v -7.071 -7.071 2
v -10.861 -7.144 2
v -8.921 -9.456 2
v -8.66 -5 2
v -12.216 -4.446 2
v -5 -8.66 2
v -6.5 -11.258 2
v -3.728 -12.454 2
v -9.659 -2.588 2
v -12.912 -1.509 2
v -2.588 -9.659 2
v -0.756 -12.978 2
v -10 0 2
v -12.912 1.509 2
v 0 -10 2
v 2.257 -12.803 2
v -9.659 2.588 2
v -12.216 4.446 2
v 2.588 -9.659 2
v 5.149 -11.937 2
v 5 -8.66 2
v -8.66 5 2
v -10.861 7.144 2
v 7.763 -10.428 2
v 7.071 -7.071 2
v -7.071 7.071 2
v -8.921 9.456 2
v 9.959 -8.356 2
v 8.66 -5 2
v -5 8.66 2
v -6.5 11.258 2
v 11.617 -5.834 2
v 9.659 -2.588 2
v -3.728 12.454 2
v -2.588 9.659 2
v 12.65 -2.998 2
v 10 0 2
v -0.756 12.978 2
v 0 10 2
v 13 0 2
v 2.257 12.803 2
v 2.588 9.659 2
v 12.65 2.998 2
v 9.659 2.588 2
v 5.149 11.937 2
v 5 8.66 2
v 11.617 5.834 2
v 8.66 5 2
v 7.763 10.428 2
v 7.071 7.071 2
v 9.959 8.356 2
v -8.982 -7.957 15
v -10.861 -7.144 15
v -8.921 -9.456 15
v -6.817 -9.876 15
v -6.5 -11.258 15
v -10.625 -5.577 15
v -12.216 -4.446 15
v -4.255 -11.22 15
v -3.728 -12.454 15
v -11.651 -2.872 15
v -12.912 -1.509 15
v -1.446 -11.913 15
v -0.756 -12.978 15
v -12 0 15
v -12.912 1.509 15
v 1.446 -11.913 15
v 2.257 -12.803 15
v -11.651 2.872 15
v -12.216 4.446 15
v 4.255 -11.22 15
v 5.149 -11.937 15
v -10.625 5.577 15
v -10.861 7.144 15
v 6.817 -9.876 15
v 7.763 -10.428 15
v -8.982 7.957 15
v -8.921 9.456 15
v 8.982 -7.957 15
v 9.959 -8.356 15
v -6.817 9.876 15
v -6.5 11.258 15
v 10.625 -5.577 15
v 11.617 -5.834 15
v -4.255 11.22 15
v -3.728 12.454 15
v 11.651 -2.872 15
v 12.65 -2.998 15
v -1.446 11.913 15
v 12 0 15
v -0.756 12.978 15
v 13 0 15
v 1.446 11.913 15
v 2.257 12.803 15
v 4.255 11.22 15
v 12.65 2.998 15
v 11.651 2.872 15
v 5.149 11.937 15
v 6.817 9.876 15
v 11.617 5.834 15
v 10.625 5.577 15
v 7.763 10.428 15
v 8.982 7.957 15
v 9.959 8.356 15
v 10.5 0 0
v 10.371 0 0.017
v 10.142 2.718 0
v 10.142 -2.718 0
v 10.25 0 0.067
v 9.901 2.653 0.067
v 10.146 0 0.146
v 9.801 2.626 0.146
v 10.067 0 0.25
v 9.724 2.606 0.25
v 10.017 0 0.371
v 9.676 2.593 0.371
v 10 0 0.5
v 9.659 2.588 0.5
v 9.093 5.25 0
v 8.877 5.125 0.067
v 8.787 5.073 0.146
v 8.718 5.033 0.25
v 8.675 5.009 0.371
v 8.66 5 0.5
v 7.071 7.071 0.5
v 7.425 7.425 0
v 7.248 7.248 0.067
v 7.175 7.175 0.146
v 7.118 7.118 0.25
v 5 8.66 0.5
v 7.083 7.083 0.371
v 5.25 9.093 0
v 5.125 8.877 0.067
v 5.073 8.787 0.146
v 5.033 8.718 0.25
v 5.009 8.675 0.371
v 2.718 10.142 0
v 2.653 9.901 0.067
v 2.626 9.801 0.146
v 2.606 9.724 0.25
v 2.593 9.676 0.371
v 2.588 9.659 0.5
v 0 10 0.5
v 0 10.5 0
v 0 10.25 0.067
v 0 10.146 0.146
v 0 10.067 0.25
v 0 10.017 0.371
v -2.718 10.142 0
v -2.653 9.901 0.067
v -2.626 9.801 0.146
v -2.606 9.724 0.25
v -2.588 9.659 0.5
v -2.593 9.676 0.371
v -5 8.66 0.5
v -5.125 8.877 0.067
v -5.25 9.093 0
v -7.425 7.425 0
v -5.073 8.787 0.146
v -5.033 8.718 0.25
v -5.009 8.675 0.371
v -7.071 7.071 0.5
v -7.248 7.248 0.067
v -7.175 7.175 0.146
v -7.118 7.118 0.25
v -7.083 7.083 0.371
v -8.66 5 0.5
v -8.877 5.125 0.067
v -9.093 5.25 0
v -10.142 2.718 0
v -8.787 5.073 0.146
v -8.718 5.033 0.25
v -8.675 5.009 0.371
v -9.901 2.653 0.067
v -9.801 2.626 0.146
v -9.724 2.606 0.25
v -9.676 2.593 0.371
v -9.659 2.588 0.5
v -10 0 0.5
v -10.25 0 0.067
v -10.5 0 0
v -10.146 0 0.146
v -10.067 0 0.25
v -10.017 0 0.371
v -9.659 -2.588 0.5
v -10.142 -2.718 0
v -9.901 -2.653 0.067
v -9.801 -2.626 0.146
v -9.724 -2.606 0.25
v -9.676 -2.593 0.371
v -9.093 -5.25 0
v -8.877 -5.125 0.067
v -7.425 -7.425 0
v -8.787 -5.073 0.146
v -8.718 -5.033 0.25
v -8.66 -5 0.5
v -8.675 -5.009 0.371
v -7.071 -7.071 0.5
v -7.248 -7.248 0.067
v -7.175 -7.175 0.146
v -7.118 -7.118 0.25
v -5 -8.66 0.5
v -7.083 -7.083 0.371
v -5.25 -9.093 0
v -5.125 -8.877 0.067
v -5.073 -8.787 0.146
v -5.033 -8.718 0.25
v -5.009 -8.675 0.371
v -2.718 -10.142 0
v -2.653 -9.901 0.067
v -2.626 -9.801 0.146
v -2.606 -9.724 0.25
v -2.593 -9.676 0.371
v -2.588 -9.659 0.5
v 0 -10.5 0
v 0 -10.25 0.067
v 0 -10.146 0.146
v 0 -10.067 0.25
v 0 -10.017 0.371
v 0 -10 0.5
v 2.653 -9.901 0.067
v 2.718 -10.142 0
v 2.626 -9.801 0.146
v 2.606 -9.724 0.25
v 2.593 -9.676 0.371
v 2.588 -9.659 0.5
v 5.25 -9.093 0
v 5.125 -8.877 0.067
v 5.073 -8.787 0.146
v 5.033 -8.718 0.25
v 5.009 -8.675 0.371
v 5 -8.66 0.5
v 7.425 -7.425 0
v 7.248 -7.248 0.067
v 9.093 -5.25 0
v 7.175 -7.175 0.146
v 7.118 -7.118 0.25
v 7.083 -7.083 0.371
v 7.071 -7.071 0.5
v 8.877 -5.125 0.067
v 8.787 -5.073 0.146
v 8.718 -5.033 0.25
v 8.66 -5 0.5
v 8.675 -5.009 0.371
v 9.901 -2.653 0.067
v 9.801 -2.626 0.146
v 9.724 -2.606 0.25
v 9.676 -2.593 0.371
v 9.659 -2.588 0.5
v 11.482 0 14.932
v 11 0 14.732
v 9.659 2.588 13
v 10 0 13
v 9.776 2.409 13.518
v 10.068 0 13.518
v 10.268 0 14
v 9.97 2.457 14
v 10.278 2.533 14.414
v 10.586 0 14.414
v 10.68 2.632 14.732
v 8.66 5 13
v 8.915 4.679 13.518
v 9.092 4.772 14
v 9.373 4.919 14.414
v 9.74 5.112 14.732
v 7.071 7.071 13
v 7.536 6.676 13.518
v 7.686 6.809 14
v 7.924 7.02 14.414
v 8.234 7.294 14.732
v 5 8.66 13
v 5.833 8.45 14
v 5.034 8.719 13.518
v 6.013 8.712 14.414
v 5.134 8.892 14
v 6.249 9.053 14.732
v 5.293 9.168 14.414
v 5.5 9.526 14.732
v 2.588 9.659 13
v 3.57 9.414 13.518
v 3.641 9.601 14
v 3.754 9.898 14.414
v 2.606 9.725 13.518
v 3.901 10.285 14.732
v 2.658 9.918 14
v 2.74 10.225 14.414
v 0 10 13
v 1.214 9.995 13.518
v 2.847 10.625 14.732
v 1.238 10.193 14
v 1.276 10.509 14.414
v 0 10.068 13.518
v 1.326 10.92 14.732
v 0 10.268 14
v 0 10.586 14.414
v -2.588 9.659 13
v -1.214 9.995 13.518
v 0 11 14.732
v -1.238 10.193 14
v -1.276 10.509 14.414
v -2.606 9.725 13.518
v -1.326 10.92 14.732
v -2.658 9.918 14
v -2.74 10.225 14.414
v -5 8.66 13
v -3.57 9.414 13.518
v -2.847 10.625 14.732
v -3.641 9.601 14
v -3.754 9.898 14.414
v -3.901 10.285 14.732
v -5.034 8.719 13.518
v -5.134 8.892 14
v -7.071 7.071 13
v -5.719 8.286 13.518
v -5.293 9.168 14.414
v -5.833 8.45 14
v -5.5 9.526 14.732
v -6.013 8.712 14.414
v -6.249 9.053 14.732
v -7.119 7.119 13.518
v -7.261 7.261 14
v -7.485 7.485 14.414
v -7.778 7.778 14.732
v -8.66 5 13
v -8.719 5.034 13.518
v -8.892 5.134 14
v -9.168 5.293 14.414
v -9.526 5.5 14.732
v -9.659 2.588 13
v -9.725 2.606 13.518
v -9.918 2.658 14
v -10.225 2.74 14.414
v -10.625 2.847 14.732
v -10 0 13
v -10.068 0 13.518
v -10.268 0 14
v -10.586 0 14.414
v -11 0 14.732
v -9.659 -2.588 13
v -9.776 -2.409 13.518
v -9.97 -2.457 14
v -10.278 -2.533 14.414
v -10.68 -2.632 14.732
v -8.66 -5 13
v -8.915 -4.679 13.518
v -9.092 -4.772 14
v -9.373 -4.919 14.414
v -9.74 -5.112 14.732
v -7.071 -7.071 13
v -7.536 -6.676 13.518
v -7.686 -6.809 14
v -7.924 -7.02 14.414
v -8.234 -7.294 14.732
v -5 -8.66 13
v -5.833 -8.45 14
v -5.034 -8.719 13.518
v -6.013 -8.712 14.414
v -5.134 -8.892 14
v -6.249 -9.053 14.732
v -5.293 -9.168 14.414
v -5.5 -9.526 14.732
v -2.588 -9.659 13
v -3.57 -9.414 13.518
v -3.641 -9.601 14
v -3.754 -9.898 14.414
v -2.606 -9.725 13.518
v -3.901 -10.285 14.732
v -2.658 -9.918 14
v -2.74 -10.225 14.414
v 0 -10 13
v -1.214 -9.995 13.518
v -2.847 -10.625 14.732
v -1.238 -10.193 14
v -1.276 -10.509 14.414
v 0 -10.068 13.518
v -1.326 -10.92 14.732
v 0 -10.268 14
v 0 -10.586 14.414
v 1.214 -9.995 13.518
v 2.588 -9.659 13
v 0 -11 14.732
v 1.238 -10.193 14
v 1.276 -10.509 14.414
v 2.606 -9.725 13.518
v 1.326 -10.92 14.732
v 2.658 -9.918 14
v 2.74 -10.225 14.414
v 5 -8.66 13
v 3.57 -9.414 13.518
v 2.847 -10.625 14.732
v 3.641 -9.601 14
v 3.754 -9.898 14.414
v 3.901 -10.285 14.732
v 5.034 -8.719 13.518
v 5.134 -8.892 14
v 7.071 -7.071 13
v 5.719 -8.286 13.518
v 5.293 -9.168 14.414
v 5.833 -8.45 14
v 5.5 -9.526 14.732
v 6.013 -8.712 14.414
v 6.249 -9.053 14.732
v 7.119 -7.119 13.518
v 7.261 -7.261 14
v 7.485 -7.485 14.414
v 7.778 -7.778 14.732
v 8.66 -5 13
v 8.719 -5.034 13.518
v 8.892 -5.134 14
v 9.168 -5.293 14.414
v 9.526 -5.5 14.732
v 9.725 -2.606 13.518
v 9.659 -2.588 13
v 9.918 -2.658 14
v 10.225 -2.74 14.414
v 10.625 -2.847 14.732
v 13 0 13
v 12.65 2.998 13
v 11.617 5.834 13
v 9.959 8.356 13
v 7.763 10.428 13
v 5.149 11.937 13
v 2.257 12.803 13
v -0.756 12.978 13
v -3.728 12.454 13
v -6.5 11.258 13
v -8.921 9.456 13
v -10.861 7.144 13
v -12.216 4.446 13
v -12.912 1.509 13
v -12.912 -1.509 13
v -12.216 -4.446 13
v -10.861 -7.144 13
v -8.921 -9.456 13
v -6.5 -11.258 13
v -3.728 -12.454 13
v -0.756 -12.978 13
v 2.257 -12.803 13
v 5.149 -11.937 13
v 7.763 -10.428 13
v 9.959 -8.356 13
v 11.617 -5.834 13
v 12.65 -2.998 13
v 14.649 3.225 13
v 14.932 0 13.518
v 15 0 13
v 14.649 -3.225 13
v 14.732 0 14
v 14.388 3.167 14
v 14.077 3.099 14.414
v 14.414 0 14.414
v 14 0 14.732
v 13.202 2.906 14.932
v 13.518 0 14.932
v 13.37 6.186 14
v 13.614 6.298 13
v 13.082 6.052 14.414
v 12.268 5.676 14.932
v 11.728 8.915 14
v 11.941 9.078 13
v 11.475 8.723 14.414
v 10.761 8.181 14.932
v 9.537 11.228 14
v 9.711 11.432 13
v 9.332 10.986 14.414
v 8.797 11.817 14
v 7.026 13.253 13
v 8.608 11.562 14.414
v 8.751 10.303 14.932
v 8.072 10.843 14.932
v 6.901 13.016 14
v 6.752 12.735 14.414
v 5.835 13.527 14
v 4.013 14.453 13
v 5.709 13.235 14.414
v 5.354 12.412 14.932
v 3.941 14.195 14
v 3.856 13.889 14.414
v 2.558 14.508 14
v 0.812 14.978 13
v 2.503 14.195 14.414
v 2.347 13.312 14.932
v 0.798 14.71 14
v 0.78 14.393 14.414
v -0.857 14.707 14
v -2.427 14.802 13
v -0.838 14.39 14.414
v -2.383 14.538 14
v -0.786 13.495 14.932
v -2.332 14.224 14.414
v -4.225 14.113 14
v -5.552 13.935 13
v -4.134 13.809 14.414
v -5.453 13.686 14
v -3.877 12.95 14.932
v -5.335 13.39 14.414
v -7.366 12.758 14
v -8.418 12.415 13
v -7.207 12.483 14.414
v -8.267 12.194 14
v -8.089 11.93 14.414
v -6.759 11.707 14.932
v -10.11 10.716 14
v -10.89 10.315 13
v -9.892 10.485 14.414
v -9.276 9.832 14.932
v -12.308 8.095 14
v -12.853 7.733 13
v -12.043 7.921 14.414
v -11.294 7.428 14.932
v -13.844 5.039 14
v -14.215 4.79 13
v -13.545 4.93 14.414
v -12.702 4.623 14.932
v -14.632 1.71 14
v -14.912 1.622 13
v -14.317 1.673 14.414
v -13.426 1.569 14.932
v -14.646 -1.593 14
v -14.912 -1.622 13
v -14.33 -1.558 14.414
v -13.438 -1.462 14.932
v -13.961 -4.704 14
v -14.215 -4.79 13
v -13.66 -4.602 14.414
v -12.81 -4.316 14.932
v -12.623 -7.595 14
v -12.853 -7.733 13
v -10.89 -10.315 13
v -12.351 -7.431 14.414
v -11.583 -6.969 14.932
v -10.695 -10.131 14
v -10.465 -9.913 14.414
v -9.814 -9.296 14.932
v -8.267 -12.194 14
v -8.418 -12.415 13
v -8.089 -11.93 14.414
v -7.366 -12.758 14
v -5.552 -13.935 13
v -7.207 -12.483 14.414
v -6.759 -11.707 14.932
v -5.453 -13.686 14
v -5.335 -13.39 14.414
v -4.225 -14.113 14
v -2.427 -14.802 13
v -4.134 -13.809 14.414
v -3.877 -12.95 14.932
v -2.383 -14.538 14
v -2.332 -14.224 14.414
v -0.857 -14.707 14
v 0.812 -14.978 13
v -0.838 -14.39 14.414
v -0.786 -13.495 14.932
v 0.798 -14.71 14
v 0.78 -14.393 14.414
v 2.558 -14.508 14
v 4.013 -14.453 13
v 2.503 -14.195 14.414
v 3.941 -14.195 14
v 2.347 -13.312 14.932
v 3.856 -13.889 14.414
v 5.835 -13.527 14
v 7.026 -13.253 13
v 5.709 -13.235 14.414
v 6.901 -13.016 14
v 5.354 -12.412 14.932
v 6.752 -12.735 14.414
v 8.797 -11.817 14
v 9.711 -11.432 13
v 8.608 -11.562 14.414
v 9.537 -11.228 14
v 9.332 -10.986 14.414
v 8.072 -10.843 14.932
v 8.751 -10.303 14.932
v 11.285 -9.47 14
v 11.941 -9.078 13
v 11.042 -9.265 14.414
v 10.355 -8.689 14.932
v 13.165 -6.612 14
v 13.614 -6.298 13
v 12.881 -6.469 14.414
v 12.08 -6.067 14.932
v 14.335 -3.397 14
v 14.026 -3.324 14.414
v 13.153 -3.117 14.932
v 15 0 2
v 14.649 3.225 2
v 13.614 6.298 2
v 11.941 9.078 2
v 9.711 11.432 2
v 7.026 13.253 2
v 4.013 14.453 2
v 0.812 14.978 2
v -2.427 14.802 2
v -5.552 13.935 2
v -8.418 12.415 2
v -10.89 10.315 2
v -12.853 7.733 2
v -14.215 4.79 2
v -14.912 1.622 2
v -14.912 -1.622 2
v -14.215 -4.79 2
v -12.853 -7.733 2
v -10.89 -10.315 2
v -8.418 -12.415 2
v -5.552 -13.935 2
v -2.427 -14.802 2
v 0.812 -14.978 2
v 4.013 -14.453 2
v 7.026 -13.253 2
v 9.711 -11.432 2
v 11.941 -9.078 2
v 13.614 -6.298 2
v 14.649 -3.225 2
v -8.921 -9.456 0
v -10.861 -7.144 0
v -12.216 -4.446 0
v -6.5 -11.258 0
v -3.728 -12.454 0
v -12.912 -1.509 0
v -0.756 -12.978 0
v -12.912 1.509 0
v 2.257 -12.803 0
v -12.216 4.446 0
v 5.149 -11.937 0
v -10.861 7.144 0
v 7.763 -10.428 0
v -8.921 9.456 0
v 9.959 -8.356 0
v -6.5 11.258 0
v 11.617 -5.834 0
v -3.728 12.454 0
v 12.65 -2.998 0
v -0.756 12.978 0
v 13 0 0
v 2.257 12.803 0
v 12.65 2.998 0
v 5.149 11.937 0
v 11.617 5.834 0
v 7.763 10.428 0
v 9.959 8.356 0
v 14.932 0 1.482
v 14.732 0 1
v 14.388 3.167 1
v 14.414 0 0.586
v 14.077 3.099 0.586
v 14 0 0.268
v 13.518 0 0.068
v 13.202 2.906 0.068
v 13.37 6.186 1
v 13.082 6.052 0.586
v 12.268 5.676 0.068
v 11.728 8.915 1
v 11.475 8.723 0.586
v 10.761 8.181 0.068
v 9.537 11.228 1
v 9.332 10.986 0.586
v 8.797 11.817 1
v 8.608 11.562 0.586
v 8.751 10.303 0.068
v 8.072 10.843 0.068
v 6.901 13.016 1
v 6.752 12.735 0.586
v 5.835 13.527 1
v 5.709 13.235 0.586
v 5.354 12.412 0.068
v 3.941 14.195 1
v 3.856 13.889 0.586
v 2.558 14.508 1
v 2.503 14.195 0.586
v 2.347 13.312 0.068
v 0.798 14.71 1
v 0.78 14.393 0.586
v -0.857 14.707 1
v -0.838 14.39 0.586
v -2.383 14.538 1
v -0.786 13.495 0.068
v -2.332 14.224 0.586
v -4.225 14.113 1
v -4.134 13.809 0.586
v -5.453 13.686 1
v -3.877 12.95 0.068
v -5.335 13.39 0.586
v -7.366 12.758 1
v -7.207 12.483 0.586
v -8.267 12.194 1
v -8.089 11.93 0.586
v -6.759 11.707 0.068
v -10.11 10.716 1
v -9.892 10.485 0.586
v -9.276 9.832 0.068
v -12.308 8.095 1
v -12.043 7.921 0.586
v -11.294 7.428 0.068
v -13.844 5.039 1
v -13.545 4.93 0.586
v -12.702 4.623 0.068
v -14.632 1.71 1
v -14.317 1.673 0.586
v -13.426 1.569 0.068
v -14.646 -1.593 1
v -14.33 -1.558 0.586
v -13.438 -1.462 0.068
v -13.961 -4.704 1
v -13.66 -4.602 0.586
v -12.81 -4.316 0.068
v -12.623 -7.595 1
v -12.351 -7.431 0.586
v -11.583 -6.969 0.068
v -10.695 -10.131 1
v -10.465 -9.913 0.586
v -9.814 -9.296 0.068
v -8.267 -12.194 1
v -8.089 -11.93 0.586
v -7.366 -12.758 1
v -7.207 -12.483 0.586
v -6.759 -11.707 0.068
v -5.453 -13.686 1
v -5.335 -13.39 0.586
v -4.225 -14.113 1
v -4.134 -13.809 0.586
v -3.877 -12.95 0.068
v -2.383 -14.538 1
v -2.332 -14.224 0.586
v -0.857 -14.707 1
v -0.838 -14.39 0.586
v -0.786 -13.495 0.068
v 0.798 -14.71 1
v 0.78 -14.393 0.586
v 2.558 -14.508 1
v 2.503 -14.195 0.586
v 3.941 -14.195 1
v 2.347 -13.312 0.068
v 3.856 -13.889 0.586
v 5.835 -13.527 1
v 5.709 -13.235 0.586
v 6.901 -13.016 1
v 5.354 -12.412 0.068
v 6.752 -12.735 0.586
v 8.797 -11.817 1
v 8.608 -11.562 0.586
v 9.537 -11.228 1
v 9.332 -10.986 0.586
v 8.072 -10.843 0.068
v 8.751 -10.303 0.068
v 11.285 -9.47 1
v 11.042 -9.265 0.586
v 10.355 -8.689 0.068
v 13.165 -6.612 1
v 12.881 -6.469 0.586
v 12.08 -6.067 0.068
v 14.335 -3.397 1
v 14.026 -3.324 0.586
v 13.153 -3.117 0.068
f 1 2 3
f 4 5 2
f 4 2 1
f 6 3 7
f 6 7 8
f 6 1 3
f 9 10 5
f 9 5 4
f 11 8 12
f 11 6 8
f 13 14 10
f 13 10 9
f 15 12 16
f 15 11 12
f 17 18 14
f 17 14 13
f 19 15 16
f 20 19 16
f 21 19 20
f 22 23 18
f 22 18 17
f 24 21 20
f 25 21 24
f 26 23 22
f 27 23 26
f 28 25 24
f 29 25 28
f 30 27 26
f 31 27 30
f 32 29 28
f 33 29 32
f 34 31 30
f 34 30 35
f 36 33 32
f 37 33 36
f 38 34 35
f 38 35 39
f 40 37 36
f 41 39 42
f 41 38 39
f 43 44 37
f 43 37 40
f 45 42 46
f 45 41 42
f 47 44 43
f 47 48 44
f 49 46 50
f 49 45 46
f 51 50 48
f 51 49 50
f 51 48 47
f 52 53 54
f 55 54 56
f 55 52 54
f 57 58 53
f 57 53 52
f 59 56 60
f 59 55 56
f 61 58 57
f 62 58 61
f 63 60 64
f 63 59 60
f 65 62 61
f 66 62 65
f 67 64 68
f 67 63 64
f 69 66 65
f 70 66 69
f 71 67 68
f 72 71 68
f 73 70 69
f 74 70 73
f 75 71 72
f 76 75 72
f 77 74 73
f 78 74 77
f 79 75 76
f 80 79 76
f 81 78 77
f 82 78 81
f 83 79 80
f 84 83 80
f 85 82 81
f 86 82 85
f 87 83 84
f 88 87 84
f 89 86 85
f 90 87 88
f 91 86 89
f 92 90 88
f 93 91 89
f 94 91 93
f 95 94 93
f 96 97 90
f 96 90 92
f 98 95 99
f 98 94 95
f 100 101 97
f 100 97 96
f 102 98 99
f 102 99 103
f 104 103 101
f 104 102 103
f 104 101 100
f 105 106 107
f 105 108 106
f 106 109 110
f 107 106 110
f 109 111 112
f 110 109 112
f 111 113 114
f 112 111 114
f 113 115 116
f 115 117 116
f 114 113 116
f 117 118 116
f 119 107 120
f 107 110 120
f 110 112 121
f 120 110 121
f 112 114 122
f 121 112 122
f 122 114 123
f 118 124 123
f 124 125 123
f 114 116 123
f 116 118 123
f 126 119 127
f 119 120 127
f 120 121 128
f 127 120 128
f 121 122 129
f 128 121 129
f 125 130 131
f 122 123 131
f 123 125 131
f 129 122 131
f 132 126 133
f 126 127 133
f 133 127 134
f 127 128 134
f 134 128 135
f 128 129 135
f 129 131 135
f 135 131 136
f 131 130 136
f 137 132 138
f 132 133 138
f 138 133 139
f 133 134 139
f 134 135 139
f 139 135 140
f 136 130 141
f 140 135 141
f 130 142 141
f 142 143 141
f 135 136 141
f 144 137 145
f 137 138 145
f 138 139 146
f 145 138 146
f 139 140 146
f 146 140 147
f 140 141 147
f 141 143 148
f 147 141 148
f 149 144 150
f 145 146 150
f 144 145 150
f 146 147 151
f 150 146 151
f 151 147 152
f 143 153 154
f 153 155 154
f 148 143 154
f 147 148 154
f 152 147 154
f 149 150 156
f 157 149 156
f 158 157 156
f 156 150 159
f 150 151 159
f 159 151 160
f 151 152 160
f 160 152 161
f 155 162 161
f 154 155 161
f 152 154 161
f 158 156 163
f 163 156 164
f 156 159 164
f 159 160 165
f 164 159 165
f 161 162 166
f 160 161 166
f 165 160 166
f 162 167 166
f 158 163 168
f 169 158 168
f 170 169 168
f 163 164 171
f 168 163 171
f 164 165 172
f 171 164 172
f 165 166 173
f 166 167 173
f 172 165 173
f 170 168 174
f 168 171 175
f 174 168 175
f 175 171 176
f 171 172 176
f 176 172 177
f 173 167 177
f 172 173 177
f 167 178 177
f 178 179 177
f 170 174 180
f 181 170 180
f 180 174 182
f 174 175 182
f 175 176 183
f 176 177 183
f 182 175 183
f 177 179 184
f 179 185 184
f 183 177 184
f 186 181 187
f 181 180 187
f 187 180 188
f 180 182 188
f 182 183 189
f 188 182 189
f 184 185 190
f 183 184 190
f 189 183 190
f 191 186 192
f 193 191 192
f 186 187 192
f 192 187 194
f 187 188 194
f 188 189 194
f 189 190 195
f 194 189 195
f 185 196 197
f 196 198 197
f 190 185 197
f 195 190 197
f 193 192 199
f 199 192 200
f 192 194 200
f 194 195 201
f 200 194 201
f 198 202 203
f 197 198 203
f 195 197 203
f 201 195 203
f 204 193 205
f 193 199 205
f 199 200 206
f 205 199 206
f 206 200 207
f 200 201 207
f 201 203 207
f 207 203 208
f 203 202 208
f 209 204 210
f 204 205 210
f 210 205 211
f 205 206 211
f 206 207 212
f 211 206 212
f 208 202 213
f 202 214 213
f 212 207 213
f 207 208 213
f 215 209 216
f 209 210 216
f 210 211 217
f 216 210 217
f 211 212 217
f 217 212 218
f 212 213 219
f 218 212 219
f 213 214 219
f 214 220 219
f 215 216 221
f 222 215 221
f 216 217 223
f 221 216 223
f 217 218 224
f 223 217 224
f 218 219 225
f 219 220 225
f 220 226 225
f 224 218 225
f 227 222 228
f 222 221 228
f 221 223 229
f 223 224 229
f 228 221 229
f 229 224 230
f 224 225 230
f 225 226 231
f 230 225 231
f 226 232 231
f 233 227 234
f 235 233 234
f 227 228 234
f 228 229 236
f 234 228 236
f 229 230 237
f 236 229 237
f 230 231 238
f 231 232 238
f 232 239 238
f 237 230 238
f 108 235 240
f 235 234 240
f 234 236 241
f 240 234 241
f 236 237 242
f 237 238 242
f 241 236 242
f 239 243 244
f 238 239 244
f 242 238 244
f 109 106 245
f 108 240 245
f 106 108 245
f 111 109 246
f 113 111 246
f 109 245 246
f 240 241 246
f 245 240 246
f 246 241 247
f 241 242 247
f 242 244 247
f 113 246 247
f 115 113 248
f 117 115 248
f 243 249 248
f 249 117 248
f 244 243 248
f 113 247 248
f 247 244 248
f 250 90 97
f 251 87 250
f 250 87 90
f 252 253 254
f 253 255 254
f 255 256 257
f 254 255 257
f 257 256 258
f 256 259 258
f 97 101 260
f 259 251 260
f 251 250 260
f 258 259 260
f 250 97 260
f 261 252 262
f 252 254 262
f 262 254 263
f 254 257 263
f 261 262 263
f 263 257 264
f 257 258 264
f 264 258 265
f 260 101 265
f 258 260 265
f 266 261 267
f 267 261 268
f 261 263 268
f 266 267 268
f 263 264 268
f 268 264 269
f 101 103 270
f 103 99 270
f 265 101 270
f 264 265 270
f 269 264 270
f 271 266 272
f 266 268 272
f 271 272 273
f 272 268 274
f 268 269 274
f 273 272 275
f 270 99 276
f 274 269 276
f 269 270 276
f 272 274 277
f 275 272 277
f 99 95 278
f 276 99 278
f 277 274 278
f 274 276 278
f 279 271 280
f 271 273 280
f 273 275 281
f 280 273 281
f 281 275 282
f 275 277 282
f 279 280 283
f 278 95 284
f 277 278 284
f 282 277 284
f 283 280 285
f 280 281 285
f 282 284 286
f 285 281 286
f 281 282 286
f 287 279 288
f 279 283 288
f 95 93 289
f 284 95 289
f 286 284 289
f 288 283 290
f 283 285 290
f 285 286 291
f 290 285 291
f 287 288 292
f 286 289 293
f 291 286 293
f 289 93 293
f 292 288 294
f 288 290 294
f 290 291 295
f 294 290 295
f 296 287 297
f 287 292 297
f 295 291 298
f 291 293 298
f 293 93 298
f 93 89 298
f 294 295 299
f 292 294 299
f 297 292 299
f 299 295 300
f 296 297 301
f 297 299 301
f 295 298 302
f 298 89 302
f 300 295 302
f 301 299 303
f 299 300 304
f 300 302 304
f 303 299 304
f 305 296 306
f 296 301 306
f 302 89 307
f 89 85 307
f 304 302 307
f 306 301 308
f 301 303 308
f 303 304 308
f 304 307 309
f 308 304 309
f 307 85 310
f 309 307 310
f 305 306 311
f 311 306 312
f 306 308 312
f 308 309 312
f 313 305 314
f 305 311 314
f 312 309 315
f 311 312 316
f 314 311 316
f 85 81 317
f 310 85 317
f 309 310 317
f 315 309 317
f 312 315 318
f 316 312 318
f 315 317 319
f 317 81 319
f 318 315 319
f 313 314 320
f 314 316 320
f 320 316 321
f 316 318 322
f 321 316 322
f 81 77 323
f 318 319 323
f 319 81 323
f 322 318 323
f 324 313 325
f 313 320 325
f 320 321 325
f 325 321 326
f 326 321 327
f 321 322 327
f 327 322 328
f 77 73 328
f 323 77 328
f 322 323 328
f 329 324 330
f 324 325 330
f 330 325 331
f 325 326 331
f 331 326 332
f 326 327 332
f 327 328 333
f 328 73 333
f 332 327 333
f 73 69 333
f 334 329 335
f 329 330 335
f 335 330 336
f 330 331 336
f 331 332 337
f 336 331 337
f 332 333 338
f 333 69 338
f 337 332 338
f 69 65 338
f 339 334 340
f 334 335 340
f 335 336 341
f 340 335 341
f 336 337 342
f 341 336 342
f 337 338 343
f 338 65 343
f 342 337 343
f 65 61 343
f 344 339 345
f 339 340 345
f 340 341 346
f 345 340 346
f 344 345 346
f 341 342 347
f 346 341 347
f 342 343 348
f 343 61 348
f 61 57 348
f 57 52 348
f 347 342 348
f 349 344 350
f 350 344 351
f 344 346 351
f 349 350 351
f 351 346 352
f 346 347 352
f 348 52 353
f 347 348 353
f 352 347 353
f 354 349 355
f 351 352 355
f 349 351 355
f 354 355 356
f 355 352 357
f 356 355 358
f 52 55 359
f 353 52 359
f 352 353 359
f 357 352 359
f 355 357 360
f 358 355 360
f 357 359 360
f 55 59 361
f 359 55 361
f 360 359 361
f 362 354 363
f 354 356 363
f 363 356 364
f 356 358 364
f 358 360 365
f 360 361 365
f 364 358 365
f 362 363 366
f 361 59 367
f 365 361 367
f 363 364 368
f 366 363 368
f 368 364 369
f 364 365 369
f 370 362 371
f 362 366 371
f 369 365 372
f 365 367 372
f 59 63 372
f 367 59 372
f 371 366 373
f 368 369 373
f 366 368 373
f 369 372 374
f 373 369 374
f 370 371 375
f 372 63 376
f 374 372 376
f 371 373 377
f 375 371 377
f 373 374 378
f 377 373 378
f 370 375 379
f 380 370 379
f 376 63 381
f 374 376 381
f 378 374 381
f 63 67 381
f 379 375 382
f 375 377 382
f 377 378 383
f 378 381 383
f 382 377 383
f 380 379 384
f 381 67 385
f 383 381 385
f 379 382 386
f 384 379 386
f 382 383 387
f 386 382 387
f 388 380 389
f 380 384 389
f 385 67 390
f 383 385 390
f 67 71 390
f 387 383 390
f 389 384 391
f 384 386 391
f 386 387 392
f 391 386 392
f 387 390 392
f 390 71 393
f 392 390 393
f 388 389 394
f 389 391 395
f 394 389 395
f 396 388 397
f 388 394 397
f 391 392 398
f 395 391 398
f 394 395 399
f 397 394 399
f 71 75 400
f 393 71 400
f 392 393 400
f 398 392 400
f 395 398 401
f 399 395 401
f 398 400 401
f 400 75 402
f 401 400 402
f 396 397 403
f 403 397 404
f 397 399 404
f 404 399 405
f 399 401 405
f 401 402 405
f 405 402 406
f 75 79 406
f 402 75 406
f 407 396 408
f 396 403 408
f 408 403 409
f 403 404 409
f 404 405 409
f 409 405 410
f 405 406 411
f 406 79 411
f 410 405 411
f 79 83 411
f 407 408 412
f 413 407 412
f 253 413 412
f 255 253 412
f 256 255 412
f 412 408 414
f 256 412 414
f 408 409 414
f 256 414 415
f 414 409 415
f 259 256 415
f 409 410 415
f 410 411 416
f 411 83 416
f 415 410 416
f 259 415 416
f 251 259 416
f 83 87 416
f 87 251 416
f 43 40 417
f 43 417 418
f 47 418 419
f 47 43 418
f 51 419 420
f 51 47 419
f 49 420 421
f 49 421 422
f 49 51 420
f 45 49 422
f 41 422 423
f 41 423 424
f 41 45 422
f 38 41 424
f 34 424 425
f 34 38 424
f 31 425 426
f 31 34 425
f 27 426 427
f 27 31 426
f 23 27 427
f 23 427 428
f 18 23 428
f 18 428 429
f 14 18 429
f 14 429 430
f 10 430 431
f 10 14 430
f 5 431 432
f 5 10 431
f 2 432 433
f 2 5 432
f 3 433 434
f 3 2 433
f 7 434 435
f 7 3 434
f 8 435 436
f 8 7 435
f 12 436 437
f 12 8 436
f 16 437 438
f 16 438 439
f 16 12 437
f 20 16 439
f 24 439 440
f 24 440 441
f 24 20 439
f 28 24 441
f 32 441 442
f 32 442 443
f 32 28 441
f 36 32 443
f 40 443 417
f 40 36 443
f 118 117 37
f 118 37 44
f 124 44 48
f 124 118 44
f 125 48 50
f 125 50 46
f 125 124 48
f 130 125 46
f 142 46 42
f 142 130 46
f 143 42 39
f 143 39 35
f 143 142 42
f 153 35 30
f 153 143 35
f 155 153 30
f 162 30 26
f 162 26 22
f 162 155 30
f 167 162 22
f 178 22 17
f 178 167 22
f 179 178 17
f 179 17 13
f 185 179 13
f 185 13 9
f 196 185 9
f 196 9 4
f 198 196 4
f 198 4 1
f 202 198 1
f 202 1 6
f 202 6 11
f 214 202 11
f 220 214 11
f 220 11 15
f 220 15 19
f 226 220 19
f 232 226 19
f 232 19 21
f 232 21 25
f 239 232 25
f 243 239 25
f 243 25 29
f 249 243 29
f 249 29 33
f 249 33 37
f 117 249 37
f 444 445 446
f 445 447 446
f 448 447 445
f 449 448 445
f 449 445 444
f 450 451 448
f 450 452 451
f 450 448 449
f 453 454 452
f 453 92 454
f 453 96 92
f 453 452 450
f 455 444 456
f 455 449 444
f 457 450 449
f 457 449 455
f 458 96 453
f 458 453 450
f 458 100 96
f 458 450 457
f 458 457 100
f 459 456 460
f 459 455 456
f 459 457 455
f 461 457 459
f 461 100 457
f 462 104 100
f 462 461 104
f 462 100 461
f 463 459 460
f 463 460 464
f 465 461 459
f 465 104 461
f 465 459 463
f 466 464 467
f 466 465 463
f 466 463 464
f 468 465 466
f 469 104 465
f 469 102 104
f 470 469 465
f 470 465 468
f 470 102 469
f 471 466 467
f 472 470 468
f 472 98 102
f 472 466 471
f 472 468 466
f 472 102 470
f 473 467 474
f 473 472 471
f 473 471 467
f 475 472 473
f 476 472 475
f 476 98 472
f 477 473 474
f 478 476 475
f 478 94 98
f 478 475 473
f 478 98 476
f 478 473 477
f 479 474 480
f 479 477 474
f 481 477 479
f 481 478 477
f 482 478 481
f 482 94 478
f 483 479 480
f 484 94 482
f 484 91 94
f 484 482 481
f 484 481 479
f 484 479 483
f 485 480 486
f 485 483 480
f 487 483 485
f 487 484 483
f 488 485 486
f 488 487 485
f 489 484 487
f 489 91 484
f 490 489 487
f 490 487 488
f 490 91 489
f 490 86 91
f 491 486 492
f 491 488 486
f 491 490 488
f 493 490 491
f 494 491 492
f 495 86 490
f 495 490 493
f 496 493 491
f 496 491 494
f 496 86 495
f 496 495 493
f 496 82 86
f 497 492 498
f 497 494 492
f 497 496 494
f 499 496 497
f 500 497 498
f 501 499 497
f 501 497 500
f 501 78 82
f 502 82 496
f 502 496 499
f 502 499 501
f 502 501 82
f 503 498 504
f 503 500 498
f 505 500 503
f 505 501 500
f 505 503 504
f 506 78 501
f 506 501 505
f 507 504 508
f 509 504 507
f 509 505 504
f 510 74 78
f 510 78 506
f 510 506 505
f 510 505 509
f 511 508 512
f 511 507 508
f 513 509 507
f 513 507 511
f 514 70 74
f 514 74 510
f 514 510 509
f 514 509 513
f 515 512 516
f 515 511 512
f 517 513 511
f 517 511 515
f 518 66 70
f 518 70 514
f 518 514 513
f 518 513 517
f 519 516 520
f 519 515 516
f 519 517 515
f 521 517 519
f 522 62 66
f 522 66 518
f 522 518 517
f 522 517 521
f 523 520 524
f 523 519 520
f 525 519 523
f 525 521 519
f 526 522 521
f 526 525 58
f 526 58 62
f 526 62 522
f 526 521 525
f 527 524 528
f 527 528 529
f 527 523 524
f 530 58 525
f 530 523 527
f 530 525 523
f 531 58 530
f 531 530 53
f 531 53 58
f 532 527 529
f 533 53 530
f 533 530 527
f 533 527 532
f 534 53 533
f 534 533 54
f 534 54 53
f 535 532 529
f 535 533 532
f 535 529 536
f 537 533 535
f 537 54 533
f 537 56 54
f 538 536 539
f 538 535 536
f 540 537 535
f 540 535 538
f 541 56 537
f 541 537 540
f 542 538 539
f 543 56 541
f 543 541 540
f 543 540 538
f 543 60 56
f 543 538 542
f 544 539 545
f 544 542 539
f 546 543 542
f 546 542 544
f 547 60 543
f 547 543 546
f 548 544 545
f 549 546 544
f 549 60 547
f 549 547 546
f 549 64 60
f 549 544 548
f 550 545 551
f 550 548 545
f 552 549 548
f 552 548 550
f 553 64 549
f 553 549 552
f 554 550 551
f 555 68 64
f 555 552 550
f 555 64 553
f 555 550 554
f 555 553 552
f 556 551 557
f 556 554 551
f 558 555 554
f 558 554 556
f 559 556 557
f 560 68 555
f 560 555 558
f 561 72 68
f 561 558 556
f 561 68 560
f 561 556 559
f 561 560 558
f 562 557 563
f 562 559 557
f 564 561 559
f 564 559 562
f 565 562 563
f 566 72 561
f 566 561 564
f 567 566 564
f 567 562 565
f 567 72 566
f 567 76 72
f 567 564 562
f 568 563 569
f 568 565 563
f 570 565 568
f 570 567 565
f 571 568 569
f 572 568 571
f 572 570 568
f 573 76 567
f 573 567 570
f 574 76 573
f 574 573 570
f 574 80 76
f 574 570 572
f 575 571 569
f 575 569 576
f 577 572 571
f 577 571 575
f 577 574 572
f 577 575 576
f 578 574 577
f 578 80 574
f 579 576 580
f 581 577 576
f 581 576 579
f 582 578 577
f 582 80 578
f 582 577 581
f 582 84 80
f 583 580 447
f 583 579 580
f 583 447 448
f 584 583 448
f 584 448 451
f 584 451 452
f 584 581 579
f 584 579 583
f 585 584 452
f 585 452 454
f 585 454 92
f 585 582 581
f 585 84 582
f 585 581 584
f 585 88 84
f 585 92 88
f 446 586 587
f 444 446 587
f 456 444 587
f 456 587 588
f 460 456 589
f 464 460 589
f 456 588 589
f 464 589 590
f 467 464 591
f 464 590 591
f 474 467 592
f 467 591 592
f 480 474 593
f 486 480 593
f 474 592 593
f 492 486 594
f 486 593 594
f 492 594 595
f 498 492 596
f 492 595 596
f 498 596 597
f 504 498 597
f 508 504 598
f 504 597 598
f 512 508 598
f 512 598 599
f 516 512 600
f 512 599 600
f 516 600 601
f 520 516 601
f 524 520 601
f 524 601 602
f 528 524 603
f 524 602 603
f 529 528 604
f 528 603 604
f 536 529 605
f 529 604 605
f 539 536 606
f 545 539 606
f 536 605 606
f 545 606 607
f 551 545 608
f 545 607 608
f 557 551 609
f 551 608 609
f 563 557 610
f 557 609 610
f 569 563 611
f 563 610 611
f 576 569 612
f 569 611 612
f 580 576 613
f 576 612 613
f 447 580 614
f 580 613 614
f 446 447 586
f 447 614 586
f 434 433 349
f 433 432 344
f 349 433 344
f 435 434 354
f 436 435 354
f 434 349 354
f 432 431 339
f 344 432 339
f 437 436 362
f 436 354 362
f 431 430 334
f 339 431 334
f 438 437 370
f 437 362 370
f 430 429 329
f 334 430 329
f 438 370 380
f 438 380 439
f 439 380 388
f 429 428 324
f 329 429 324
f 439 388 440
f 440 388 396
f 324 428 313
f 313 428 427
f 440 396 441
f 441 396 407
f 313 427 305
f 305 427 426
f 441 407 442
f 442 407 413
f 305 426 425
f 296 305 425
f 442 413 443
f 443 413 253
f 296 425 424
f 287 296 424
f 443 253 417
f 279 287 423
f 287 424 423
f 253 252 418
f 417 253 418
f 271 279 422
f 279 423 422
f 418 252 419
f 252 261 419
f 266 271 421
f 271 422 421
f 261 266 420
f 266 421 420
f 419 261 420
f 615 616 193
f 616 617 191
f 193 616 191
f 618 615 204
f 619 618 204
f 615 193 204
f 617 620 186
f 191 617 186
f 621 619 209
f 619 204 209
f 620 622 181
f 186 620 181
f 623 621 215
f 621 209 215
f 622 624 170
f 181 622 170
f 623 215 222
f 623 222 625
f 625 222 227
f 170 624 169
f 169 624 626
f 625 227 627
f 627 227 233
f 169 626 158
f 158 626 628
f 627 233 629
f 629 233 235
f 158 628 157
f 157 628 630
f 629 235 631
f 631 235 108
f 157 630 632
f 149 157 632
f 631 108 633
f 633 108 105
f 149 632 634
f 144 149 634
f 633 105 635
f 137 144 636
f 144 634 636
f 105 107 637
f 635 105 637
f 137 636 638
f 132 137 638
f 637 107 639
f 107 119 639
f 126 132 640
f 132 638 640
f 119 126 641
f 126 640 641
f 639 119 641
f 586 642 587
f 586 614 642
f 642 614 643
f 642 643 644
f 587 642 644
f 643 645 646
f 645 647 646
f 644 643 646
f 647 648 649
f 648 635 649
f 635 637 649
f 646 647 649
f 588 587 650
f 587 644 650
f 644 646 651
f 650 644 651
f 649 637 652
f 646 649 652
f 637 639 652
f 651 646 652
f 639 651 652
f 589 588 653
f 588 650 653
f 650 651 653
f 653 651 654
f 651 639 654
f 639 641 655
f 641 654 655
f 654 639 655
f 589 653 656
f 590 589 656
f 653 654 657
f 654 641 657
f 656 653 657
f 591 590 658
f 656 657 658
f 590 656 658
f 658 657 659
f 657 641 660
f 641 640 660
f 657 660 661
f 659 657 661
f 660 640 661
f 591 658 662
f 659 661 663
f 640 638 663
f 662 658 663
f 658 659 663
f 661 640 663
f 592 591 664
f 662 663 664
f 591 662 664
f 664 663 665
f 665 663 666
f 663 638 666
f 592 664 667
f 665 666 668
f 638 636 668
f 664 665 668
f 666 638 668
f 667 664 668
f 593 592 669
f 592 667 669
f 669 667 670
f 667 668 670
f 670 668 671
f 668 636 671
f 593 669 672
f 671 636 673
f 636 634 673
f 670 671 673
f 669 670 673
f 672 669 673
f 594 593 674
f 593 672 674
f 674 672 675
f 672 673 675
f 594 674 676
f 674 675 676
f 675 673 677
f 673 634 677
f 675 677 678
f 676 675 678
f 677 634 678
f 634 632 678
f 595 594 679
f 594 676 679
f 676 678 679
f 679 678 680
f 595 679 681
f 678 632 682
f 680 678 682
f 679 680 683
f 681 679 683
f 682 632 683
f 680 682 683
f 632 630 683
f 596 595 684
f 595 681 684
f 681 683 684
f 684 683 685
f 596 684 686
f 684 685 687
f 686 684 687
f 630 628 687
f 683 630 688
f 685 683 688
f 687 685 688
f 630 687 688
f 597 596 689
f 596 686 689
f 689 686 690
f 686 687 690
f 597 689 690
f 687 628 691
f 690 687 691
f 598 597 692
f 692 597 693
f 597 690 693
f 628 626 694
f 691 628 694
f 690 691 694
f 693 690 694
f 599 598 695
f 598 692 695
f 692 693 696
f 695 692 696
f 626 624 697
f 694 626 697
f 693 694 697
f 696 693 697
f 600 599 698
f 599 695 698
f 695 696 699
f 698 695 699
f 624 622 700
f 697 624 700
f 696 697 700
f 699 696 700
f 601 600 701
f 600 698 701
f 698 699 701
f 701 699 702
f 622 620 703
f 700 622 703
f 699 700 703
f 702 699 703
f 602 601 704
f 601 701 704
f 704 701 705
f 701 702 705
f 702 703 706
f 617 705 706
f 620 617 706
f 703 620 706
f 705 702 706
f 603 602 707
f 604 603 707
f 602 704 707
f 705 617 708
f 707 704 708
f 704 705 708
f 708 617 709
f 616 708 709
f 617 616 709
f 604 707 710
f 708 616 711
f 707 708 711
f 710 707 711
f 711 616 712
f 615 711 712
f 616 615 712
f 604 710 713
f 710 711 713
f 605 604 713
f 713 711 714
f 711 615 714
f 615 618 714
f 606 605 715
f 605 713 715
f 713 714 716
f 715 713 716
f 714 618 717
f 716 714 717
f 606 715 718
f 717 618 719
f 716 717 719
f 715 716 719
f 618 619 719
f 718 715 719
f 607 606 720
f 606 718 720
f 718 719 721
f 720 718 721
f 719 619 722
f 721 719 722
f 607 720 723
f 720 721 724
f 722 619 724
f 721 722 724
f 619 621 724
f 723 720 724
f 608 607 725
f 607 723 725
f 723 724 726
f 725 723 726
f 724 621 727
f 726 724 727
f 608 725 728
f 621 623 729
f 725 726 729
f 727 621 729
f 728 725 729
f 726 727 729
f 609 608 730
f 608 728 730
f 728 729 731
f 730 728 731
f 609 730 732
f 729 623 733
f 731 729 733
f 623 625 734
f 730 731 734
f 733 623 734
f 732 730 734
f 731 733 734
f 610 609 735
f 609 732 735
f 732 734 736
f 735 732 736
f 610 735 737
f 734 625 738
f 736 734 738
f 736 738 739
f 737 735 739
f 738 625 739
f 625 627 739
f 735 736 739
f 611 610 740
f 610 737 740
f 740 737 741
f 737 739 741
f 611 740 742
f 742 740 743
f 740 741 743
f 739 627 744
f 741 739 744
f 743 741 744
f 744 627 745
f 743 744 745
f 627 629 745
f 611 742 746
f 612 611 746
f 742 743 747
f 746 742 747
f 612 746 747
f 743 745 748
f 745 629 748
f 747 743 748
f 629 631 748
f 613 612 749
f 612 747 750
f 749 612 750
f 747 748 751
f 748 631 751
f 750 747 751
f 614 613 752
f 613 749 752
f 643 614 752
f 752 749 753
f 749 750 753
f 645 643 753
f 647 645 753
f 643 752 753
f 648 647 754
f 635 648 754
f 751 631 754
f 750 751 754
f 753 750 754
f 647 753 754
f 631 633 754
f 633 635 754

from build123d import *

# Parameters (mm, degrees)
SKETCH1_R           = 15
SKETCH1_R_2         = 10
EXTRUDE_THIN1_DEPTH = 15
FILLET1_R           = 2
FILLET2_R           = 0.5
SHELL5_START        = 2
SHELL5_OUTLINE_R    = 13
SHELL5_OUTLINE_R_2  = 10
SHELL5_DEPTH        = 11


# Read off the part's stored shape, not the designer's step: Shell5
with BuildPart() as part:
    # Sketch1 → Extrude-Thin1 (new body)
    with BuildSketch(Plane.XY):
        Circle(SKETCH1_R)
        Circle(SKETCH1_R_2, mode=Mode.SUBTRACT)
    extrude(amount=EXTRUDE_THIN1_DEPTH)

    # Fillet1
    fillet1_edges = [part.edges().sort_by_distance(p)[0] for p in [
        (-15, 0, 0),
        (-15, 0, 15),
        (-10, 0, 15),
    ]]
    fillet(fillet1_edges, radius=FILLET1_R)

    # Fillet2
    fillet2_edges = [part.edges().sort_by_distance(p)[0] for p in [
        (-10, 0, 0),
    ]]
    fillet(fillet2_edges, radius=FILLET2_R)

    # Shell5 outline → Shell5 (cut)
    with BuildSketch(Plane.XY.offset(SHELL5_START)):
        Circle(SHELL5_OUTLINE_R)
        Circle(SHELL5_OUTLINE_R_2, mode=Mode.SUBTRACT)
    extrude(amount=SHELL5_DEPTH, mode=Mode.SUBTRACT)


solid = part.part
